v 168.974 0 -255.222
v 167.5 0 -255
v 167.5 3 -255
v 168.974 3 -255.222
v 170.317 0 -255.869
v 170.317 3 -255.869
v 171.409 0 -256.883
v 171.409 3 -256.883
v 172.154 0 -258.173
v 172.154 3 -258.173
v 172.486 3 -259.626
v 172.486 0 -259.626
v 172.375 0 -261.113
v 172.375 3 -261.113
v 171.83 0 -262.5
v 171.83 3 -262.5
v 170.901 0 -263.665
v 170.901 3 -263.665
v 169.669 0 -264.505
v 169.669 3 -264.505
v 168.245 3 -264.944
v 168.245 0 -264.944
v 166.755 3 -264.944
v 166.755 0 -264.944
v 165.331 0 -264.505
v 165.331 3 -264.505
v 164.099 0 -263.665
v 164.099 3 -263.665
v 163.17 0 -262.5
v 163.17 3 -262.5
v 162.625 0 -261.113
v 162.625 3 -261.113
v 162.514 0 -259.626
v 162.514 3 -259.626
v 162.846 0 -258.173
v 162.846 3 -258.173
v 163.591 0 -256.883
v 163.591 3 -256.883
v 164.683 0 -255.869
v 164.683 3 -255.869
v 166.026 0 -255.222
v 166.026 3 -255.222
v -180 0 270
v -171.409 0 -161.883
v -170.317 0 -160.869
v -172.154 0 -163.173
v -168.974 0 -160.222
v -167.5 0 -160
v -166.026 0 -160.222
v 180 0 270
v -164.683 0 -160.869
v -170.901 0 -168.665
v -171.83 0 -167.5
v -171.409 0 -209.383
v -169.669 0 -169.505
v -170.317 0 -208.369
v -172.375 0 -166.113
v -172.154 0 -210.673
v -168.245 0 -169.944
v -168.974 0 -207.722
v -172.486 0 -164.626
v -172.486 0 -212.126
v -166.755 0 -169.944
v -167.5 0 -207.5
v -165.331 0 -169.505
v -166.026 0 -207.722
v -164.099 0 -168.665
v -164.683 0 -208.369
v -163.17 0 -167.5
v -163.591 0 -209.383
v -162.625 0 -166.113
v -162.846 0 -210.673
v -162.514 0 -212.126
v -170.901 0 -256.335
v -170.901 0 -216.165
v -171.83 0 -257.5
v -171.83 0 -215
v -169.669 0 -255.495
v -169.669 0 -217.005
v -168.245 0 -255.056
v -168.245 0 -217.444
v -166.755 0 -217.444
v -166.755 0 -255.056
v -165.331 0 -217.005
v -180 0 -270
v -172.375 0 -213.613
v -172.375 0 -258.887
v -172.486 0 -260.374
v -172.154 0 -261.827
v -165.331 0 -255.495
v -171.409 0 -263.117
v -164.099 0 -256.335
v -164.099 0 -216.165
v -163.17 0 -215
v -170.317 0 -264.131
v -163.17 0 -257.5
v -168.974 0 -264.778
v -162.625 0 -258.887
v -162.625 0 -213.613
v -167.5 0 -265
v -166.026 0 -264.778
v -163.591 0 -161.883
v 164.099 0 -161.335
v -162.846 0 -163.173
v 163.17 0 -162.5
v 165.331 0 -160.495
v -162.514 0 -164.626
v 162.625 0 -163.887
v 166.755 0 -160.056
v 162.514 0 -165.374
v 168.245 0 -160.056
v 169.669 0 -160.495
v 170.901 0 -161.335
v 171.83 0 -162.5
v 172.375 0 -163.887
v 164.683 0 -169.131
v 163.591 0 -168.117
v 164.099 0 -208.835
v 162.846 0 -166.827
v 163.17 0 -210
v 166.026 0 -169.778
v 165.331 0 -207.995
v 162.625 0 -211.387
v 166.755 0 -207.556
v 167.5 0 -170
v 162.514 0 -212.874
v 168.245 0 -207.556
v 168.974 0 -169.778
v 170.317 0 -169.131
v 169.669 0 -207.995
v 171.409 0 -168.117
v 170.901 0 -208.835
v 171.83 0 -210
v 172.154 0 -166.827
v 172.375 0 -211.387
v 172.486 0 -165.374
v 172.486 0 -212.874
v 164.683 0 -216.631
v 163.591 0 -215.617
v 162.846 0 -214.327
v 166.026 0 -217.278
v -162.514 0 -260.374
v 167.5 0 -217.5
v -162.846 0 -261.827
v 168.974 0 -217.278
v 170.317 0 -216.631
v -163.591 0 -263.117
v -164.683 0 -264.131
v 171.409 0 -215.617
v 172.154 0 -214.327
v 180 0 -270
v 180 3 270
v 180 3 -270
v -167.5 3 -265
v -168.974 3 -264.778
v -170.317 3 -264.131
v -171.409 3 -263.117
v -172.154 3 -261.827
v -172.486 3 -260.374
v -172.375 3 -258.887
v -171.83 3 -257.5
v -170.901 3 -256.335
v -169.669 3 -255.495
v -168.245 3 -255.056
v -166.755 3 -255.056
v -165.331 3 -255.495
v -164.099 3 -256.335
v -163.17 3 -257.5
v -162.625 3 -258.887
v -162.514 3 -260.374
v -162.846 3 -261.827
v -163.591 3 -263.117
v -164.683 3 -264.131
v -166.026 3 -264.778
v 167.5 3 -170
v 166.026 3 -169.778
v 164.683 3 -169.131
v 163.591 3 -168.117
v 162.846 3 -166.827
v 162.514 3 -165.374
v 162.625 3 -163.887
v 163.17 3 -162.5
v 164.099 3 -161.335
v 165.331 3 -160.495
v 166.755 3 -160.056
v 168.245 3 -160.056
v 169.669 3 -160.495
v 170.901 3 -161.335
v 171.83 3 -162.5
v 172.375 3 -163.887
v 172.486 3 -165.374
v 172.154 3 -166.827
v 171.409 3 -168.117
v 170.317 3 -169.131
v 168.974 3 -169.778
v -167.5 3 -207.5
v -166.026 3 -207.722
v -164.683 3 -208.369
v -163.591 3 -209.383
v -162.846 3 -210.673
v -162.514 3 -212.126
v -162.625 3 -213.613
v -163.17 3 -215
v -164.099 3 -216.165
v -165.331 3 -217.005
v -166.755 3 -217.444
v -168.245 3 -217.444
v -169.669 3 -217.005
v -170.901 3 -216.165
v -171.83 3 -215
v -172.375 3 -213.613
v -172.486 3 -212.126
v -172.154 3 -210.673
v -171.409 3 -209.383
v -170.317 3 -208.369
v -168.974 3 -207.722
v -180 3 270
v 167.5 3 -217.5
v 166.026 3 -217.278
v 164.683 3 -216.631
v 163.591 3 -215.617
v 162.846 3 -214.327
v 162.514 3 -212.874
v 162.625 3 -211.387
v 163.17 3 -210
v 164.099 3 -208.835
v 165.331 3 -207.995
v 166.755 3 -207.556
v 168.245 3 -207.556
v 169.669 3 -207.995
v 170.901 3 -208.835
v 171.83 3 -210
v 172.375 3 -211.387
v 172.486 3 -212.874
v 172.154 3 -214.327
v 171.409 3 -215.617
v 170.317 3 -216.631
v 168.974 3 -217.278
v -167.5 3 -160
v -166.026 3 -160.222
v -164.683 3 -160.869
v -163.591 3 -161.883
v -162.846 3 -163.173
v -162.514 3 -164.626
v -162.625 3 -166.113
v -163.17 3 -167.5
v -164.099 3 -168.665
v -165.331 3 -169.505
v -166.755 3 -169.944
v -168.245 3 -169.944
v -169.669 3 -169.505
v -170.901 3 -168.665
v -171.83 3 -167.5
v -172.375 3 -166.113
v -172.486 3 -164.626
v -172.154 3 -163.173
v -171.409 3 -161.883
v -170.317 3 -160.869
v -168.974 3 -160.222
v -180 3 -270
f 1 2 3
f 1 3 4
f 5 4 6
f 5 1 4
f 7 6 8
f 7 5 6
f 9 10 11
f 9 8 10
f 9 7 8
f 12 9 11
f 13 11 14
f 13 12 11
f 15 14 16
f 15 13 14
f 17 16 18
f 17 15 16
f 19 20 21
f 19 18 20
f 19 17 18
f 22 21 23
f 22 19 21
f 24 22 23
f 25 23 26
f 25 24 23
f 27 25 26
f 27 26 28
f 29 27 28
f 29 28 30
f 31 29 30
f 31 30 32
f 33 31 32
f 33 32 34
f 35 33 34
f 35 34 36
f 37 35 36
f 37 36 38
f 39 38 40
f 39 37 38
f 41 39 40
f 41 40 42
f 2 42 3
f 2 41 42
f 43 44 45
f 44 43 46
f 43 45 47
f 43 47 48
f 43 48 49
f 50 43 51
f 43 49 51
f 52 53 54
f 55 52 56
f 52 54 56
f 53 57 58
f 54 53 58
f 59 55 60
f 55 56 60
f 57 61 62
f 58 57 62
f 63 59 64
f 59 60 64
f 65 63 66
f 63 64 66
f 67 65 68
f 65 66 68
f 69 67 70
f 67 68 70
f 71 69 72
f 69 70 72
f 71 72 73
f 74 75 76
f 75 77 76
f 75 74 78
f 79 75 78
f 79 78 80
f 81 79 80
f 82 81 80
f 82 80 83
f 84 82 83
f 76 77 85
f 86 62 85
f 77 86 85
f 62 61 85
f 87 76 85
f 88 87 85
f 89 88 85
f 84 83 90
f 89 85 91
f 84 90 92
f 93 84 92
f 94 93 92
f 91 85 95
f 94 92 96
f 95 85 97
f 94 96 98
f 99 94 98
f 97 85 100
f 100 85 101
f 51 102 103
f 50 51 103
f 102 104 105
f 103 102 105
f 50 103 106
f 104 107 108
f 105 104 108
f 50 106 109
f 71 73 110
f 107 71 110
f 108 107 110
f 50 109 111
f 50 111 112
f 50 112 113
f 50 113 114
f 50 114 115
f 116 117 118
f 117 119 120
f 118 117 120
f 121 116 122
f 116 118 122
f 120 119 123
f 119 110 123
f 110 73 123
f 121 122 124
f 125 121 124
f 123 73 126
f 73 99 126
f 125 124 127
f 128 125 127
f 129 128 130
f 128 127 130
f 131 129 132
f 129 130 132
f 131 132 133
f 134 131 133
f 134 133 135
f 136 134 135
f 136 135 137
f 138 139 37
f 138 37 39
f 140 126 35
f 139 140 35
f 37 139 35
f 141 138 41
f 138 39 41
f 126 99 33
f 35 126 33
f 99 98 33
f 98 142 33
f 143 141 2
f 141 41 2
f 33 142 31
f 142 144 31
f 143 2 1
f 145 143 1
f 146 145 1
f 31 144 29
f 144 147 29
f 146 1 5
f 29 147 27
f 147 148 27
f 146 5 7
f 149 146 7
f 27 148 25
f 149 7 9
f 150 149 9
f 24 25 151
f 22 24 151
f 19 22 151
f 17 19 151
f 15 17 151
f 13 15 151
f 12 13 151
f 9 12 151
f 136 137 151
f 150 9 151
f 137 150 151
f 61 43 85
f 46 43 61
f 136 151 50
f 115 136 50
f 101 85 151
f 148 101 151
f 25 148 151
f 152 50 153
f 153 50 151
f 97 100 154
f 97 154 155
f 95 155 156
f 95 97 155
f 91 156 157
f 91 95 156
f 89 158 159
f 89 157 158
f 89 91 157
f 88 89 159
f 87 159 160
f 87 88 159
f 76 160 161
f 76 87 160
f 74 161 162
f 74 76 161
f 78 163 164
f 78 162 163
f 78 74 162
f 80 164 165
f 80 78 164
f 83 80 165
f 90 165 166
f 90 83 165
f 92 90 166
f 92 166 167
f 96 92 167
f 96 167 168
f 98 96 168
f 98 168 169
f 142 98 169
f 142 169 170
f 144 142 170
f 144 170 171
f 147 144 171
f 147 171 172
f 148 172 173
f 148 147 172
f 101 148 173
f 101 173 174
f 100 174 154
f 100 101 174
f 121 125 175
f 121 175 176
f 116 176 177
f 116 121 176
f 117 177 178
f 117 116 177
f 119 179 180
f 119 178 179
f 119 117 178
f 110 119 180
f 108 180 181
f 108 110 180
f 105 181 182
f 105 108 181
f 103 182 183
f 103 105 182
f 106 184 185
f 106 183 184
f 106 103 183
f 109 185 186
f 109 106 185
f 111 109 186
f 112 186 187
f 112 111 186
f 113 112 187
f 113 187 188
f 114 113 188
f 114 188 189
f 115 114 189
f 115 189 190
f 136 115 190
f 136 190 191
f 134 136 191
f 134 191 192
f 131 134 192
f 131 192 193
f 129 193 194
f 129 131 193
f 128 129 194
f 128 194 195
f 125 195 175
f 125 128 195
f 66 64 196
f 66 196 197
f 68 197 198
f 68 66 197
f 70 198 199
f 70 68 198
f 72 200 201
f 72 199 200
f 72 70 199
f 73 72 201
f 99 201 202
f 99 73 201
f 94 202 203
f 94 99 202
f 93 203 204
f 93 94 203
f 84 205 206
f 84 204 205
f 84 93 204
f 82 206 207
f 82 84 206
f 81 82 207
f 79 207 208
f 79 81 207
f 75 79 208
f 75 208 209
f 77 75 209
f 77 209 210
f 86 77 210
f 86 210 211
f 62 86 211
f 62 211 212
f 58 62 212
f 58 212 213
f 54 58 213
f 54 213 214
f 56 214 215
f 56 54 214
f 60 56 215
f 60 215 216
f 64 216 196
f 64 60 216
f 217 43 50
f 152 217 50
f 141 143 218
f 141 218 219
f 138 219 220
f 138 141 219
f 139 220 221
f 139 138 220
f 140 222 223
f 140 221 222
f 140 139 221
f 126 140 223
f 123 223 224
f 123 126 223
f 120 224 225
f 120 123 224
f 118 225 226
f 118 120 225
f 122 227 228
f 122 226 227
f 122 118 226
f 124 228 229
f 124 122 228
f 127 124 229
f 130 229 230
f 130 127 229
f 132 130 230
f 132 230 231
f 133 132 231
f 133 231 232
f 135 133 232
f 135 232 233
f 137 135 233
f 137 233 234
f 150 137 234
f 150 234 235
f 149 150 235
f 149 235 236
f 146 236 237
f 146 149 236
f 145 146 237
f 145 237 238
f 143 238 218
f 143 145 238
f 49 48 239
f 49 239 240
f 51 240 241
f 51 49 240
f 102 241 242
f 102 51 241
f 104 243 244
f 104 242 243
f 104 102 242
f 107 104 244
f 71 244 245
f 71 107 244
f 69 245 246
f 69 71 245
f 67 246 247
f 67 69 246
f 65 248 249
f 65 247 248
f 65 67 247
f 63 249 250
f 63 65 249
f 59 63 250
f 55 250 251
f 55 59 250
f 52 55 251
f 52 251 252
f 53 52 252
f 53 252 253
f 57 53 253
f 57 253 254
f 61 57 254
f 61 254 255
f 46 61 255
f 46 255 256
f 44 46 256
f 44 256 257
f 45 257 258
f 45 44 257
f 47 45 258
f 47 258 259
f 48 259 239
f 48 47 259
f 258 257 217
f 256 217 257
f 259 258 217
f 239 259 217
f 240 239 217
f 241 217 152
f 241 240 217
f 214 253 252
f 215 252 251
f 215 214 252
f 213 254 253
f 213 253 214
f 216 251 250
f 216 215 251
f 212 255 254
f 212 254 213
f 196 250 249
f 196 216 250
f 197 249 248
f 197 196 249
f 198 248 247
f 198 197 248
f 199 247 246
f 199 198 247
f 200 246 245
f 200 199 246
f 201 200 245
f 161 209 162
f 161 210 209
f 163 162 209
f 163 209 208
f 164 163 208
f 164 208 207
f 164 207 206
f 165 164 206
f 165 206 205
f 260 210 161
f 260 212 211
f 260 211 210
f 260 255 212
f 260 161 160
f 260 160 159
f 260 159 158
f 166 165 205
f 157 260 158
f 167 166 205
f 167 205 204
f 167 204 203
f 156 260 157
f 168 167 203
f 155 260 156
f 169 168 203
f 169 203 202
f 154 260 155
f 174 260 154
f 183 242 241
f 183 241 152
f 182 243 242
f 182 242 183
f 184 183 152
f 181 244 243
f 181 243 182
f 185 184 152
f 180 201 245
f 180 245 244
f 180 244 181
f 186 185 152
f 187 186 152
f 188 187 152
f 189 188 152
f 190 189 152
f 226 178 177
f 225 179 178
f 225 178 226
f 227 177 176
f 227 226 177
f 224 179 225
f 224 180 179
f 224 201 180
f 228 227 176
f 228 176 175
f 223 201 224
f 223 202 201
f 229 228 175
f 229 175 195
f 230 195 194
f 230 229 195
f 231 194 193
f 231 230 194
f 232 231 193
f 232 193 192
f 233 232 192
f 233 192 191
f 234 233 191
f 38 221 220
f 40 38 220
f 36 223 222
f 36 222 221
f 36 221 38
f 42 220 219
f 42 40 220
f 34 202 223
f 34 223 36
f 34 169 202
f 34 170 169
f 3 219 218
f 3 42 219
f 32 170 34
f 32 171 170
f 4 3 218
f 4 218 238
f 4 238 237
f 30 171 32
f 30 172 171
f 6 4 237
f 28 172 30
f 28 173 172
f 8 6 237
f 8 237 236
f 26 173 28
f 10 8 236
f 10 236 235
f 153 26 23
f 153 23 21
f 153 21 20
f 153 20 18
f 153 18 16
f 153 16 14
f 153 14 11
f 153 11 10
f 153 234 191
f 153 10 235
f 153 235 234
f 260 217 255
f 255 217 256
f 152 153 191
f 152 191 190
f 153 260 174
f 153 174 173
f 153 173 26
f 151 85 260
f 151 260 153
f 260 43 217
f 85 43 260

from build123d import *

# Parameters (mm, degrees)
SKETCH1_W               = 360
SKETCH1_H               = 540
BOSS_EXTRUDE1_DEPTH     = 3
CUT_EXTRUDE1_DEPTH      = 325.513482
CUT_EXTRUDE1_DEPTH_BACK = 325.513482
SKETCH2_R               = 5


with BuildPart() as part:
    # Sketch1 → Boss-Extrude1 (new body)
    with BuildSketch(Plane(origin=(0, 0, 0), x_dir=(1, 0, 0), z_dir=(0, 1, 0))):
        Rectangle(SKETCH1_W, SKETCH1_H)
    extrude(amount=BOSS_EXTRUDE1_DEPTH)

    # Sketch2 → Cut-Extrude1 (cut, two sides: drawn at the far end of the back side and taken through both)
    with BuildSketch(Plane(origin=(0, 3, 0), x_dir=(1, 0, 0), z_dir=(0, 1, 0)).offset(-CUT_EXTRUDE1_DEPTH_BACK)):
        with Locations(Location((-167.5, 212.5, 0), (0, 0, 270))):
            Circle(SKETCH2_R)
        with Locations(Location((-167.5, 165, 0), (0, 0, 270))):
            Circle(SKETCH2_R)
        with Locations(Location((-167.5, 260, 0), (0, 0, 90))):
            Circle(SKETCH2_R)
        with Locations(Location((167.5, 260, 0), (0, 0, 270))):
            Circle(SKETCH2_R)
        with Locations(Location((167.5, 165, 0), (0, 0, 90))):
            Circle(SKETCH2_R)
        with Locations(Location((167.5, 212.5, 0), (0, 0, 90))):
            Circle(SKETCH2_R)
    extrude(amount=CUT_EXTRUDE1_DEPTH + CUT_EXTRUDE1_DEPTH_BACK, mode=Mode.SUBTRACT)


solid = part.part
